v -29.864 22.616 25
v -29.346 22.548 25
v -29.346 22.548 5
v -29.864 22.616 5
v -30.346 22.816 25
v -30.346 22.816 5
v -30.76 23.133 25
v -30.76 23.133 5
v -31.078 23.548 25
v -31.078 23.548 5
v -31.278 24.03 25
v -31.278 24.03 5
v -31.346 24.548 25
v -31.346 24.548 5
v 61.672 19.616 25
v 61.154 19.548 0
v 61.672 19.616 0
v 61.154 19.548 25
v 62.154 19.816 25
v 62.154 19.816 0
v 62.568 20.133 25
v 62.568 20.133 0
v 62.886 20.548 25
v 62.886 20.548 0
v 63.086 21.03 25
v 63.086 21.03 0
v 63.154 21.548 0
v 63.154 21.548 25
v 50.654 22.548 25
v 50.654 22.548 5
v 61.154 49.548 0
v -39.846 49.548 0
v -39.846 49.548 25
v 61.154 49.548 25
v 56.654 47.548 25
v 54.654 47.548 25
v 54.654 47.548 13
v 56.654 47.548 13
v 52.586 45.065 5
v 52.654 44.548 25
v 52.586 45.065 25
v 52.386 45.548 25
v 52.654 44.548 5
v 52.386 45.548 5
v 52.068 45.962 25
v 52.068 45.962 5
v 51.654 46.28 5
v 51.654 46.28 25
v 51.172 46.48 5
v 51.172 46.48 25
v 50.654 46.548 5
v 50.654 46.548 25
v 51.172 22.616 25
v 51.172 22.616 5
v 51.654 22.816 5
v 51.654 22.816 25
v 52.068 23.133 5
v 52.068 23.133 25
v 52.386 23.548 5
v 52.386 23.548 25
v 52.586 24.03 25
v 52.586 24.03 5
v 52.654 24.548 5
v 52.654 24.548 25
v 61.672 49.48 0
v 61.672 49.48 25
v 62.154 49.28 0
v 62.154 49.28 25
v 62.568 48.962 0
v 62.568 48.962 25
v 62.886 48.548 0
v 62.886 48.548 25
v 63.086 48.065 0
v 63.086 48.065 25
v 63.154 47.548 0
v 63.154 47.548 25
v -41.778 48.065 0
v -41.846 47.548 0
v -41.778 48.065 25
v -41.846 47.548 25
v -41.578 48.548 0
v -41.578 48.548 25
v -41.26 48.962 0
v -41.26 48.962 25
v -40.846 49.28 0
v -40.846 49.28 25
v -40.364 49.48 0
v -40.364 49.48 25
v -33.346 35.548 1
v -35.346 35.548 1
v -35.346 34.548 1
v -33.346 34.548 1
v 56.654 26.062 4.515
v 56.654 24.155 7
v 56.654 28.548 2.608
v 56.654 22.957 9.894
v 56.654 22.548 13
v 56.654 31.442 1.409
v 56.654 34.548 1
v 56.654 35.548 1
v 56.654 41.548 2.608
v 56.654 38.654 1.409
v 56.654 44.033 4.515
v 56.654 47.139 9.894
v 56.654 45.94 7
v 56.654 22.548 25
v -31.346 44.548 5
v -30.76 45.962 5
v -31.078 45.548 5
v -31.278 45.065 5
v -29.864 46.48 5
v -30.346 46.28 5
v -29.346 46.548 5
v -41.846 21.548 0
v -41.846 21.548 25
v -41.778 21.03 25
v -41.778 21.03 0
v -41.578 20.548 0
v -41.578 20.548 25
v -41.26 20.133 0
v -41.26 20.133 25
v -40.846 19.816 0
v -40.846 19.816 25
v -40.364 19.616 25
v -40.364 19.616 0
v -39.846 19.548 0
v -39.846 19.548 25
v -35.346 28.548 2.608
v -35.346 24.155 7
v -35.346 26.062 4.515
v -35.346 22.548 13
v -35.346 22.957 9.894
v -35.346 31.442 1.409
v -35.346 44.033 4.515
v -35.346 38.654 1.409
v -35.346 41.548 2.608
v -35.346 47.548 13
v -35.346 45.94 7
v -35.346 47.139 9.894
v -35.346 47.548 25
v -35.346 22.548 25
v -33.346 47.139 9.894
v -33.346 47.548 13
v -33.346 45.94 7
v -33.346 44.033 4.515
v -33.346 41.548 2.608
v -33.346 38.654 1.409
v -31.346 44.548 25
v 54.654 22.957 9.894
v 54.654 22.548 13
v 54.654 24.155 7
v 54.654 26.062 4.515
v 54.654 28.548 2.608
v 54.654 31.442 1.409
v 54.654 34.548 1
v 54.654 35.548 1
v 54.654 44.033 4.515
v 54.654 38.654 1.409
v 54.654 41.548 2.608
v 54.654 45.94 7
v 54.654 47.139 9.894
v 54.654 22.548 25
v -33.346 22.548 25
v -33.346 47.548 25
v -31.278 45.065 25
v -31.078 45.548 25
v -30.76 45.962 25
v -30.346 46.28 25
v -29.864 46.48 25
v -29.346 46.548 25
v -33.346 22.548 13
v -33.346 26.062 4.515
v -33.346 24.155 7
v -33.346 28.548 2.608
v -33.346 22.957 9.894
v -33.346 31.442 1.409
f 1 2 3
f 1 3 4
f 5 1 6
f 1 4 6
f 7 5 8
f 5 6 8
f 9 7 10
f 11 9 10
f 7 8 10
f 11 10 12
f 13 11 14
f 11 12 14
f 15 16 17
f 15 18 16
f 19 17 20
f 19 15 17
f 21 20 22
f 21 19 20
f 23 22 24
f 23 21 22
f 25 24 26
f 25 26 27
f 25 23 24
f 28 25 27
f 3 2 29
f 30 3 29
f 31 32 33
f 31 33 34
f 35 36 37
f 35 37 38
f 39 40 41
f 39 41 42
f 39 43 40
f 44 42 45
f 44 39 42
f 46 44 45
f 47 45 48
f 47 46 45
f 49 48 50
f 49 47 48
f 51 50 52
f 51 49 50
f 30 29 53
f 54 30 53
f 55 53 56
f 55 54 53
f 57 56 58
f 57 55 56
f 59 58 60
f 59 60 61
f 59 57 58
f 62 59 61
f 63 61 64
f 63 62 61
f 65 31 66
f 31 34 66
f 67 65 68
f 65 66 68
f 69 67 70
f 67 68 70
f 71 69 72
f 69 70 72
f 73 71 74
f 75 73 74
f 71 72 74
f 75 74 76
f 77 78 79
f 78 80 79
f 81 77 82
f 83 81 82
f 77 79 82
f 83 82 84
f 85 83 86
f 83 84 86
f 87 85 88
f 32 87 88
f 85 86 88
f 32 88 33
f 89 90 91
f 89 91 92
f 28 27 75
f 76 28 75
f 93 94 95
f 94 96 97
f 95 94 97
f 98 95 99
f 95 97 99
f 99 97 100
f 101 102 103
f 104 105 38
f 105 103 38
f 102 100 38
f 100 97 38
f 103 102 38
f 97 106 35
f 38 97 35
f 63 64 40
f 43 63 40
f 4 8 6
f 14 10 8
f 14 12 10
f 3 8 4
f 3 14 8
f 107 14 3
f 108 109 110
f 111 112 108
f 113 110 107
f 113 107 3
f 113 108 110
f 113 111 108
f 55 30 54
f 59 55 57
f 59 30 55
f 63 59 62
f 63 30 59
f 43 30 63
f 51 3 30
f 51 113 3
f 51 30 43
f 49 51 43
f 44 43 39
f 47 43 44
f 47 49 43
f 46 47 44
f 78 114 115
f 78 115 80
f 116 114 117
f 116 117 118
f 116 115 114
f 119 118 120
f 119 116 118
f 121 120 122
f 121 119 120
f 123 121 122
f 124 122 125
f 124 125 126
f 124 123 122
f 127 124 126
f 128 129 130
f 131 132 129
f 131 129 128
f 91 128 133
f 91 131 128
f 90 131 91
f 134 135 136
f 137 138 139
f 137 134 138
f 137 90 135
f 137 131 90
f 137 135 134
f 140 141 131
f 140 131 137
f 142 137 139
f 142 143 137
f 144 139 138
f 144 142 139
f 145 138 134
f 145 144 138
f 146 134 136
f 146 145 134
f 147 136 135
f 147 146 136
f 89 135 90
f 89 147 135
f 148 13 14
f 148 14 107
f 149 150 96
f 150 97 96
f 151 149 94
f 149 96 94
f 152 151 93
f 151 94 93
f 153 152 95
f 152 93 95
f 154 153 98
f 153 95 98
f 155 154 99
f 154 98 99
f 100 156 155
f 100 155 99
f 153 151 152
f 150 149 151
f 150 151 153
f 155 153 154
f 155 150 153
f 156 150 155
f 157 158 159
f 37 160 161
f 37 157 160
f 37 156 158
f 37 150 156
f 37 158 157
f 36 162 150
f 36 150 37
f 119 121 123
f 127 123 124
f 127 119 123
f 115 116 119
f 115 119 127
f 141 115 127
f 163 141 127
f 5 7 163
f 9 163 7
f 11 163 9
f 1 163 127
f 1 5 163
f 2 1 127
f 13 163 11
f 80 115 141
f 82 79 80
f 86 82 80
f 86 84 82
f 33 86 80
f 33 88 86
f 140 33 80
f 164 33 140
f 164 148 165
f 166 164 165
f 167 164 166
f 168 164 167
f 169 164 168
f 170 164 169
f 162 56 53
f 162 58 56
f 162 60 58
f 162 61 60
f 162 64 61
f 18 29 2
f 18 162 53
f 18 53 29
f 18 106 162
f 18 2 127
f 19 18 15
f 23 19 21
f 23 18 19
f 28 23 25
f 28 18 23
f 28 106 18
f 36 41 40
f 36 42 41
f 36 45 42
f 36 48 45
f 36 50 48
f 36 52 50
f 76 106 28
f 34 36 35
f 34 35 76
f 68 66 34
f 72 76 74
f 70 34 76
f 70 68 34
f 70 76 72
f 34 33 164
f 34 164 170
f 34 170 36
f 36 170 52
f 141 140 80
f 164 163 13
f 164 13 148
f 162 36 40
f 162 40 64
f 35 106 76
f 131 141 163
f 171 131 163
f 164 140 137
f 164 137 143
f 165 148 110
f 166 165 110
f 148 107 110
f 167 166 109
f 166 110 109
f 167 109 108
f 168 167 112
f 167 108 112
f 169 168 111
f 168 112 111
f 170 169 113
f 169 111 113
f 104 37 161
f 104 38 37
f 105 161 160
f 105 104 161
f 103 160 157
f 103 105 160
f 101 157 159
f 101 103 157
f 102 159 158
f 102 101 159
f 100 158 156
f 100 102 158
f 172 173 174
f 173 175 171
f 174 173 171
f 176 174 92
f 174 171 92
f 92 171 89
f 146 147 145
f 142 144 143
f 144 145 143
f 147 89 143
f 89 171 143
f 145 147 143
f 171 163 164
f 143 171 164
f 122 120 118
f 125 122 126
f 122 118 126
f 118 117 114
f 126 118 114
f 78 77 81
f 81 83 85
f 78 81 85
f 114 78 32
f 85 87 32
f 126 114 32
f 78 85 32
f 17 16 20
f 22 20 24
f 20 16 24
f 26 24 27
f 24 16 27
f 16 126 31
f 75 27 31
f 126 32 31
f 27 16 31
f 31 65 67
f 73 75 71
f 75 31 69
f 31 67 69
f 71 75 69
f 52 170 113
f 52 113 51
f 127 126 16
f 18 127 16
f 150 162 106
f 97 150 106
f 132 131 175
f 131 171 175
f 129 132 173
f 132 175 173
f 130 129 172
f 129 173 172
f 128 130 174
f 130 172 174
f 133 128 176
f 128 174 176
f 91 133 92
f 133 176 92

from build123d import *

# Parameters (mm, degrees)
ESQUISSE1_W             = 105
ESQUISSE1_H             = 30
BOSS_EXTRU_1_DEPTH      = 25
ESQUISSE2_W             = 2
ESQUISSE2_H             = 25
ENL_V_MAT_EXTRU_1_DEPTH = 24
CONG_3_R                = 12
CONG_4_R                = 12
ESQUISSE3_W             = 84
ESQUISSE3_H             = 24
ENL_V_MAT_EXTRU_2_DEPTH = 20
CONG_5_R                = 2
CONG_6_R                = 2
CONG_7_R                = 2


with BuildPart() as part:
    # Esquisse1 → Boss.-Extru.1 (new body)
    with BuildSketch(Plane.XY):
        with Locations((10.65403423, 34.547677262)):
            Rectangle(ESQUISSE1_W, ESQUISSE1_H)
    extrude(amount=BOSS_EXTRU_1_DEPTH)

    # Esquisse2 → Enlèv. mat.-Extru.1 (cut)
    with BuildSketch(Plane.XY.offset(25)):
        with Locations((-34.34596577, 35.047677262)):
            Rectangle(ESQUISSE2_W, ESQUISSE2_H)
        with Locations((55.65403423, 35.047677262)):
            Rectangle(ESQUISSE2_W, ESQUISSE2_H)
    extrude(amount=-ENL_V_MAT_EXTRU_1_DEPTH, mode=Mode.SUBTRACT)

    # Congé3
    cong_3_edges = [part.edges().sort_by_distance(p)[0] for p in [
        (55.65403423, 47.547677262, 1),
        (55.65403423, 22.547677262, 1),
    ]]
    fillet(cong_3_edges, radius=CONG_3_R)

    # Congé4
    cong_4_edges = [part.edges().sort_by_distance(p)[0] for p in [
        (-34.34596577, 47.547677262, 1),
        (-34.34596577, 22.547677262, 1),
    ]]
    fillet(cong_4_edges, radius=CONG_4_R)

    # Esquisse3 → Enlèv. mat.-Extru.2 (cut)
    with BuildSketch(Plane.XY.offset(25)):
        with Locations((10.65403423, 34.547677262)):
            Rectangle(ESQUISSE3_W, ESQUISSE3_H)
    extrude(amount=-ENL_V_MAT_EXTRU_2_DEPTH, mode=Mode.SUBTRACT)

    # Congé5
    cong_5_edges = [part.edges().sort_by_distance(p)[0] for p in [
        (52.65403423, 46.547677262, 15),
        (52.65403423, 22.547677262, 15),
        (-41.84596577, 49.547677262, 12.5),
        (63.15403423, 49.547677262, 12.5),
        (63.15403423, 19.547677262, 12.5),
    ]]
    fillet(cong_5_edges, radius=CONG_5_R)

    # Congé6
    cong_6_edges = [part.edges().sort_by_distance(p)[0] for p in [
        (-31.34596577, 22.547677262, 15),
        (-31.34596577, 46.547677262, 15),
    ]]
    fillet(cong_6_edges, radius=CONG_6_R)

    # Congé7
    cong_7_edges = [part.edges().sort_by_distance(p)[0] for p in [
        (-41.84596577, 19.547677262, 12.5),
    ]]
    fillet(cong_7_edges, radius=CONG_7_R)


solid = part.part
